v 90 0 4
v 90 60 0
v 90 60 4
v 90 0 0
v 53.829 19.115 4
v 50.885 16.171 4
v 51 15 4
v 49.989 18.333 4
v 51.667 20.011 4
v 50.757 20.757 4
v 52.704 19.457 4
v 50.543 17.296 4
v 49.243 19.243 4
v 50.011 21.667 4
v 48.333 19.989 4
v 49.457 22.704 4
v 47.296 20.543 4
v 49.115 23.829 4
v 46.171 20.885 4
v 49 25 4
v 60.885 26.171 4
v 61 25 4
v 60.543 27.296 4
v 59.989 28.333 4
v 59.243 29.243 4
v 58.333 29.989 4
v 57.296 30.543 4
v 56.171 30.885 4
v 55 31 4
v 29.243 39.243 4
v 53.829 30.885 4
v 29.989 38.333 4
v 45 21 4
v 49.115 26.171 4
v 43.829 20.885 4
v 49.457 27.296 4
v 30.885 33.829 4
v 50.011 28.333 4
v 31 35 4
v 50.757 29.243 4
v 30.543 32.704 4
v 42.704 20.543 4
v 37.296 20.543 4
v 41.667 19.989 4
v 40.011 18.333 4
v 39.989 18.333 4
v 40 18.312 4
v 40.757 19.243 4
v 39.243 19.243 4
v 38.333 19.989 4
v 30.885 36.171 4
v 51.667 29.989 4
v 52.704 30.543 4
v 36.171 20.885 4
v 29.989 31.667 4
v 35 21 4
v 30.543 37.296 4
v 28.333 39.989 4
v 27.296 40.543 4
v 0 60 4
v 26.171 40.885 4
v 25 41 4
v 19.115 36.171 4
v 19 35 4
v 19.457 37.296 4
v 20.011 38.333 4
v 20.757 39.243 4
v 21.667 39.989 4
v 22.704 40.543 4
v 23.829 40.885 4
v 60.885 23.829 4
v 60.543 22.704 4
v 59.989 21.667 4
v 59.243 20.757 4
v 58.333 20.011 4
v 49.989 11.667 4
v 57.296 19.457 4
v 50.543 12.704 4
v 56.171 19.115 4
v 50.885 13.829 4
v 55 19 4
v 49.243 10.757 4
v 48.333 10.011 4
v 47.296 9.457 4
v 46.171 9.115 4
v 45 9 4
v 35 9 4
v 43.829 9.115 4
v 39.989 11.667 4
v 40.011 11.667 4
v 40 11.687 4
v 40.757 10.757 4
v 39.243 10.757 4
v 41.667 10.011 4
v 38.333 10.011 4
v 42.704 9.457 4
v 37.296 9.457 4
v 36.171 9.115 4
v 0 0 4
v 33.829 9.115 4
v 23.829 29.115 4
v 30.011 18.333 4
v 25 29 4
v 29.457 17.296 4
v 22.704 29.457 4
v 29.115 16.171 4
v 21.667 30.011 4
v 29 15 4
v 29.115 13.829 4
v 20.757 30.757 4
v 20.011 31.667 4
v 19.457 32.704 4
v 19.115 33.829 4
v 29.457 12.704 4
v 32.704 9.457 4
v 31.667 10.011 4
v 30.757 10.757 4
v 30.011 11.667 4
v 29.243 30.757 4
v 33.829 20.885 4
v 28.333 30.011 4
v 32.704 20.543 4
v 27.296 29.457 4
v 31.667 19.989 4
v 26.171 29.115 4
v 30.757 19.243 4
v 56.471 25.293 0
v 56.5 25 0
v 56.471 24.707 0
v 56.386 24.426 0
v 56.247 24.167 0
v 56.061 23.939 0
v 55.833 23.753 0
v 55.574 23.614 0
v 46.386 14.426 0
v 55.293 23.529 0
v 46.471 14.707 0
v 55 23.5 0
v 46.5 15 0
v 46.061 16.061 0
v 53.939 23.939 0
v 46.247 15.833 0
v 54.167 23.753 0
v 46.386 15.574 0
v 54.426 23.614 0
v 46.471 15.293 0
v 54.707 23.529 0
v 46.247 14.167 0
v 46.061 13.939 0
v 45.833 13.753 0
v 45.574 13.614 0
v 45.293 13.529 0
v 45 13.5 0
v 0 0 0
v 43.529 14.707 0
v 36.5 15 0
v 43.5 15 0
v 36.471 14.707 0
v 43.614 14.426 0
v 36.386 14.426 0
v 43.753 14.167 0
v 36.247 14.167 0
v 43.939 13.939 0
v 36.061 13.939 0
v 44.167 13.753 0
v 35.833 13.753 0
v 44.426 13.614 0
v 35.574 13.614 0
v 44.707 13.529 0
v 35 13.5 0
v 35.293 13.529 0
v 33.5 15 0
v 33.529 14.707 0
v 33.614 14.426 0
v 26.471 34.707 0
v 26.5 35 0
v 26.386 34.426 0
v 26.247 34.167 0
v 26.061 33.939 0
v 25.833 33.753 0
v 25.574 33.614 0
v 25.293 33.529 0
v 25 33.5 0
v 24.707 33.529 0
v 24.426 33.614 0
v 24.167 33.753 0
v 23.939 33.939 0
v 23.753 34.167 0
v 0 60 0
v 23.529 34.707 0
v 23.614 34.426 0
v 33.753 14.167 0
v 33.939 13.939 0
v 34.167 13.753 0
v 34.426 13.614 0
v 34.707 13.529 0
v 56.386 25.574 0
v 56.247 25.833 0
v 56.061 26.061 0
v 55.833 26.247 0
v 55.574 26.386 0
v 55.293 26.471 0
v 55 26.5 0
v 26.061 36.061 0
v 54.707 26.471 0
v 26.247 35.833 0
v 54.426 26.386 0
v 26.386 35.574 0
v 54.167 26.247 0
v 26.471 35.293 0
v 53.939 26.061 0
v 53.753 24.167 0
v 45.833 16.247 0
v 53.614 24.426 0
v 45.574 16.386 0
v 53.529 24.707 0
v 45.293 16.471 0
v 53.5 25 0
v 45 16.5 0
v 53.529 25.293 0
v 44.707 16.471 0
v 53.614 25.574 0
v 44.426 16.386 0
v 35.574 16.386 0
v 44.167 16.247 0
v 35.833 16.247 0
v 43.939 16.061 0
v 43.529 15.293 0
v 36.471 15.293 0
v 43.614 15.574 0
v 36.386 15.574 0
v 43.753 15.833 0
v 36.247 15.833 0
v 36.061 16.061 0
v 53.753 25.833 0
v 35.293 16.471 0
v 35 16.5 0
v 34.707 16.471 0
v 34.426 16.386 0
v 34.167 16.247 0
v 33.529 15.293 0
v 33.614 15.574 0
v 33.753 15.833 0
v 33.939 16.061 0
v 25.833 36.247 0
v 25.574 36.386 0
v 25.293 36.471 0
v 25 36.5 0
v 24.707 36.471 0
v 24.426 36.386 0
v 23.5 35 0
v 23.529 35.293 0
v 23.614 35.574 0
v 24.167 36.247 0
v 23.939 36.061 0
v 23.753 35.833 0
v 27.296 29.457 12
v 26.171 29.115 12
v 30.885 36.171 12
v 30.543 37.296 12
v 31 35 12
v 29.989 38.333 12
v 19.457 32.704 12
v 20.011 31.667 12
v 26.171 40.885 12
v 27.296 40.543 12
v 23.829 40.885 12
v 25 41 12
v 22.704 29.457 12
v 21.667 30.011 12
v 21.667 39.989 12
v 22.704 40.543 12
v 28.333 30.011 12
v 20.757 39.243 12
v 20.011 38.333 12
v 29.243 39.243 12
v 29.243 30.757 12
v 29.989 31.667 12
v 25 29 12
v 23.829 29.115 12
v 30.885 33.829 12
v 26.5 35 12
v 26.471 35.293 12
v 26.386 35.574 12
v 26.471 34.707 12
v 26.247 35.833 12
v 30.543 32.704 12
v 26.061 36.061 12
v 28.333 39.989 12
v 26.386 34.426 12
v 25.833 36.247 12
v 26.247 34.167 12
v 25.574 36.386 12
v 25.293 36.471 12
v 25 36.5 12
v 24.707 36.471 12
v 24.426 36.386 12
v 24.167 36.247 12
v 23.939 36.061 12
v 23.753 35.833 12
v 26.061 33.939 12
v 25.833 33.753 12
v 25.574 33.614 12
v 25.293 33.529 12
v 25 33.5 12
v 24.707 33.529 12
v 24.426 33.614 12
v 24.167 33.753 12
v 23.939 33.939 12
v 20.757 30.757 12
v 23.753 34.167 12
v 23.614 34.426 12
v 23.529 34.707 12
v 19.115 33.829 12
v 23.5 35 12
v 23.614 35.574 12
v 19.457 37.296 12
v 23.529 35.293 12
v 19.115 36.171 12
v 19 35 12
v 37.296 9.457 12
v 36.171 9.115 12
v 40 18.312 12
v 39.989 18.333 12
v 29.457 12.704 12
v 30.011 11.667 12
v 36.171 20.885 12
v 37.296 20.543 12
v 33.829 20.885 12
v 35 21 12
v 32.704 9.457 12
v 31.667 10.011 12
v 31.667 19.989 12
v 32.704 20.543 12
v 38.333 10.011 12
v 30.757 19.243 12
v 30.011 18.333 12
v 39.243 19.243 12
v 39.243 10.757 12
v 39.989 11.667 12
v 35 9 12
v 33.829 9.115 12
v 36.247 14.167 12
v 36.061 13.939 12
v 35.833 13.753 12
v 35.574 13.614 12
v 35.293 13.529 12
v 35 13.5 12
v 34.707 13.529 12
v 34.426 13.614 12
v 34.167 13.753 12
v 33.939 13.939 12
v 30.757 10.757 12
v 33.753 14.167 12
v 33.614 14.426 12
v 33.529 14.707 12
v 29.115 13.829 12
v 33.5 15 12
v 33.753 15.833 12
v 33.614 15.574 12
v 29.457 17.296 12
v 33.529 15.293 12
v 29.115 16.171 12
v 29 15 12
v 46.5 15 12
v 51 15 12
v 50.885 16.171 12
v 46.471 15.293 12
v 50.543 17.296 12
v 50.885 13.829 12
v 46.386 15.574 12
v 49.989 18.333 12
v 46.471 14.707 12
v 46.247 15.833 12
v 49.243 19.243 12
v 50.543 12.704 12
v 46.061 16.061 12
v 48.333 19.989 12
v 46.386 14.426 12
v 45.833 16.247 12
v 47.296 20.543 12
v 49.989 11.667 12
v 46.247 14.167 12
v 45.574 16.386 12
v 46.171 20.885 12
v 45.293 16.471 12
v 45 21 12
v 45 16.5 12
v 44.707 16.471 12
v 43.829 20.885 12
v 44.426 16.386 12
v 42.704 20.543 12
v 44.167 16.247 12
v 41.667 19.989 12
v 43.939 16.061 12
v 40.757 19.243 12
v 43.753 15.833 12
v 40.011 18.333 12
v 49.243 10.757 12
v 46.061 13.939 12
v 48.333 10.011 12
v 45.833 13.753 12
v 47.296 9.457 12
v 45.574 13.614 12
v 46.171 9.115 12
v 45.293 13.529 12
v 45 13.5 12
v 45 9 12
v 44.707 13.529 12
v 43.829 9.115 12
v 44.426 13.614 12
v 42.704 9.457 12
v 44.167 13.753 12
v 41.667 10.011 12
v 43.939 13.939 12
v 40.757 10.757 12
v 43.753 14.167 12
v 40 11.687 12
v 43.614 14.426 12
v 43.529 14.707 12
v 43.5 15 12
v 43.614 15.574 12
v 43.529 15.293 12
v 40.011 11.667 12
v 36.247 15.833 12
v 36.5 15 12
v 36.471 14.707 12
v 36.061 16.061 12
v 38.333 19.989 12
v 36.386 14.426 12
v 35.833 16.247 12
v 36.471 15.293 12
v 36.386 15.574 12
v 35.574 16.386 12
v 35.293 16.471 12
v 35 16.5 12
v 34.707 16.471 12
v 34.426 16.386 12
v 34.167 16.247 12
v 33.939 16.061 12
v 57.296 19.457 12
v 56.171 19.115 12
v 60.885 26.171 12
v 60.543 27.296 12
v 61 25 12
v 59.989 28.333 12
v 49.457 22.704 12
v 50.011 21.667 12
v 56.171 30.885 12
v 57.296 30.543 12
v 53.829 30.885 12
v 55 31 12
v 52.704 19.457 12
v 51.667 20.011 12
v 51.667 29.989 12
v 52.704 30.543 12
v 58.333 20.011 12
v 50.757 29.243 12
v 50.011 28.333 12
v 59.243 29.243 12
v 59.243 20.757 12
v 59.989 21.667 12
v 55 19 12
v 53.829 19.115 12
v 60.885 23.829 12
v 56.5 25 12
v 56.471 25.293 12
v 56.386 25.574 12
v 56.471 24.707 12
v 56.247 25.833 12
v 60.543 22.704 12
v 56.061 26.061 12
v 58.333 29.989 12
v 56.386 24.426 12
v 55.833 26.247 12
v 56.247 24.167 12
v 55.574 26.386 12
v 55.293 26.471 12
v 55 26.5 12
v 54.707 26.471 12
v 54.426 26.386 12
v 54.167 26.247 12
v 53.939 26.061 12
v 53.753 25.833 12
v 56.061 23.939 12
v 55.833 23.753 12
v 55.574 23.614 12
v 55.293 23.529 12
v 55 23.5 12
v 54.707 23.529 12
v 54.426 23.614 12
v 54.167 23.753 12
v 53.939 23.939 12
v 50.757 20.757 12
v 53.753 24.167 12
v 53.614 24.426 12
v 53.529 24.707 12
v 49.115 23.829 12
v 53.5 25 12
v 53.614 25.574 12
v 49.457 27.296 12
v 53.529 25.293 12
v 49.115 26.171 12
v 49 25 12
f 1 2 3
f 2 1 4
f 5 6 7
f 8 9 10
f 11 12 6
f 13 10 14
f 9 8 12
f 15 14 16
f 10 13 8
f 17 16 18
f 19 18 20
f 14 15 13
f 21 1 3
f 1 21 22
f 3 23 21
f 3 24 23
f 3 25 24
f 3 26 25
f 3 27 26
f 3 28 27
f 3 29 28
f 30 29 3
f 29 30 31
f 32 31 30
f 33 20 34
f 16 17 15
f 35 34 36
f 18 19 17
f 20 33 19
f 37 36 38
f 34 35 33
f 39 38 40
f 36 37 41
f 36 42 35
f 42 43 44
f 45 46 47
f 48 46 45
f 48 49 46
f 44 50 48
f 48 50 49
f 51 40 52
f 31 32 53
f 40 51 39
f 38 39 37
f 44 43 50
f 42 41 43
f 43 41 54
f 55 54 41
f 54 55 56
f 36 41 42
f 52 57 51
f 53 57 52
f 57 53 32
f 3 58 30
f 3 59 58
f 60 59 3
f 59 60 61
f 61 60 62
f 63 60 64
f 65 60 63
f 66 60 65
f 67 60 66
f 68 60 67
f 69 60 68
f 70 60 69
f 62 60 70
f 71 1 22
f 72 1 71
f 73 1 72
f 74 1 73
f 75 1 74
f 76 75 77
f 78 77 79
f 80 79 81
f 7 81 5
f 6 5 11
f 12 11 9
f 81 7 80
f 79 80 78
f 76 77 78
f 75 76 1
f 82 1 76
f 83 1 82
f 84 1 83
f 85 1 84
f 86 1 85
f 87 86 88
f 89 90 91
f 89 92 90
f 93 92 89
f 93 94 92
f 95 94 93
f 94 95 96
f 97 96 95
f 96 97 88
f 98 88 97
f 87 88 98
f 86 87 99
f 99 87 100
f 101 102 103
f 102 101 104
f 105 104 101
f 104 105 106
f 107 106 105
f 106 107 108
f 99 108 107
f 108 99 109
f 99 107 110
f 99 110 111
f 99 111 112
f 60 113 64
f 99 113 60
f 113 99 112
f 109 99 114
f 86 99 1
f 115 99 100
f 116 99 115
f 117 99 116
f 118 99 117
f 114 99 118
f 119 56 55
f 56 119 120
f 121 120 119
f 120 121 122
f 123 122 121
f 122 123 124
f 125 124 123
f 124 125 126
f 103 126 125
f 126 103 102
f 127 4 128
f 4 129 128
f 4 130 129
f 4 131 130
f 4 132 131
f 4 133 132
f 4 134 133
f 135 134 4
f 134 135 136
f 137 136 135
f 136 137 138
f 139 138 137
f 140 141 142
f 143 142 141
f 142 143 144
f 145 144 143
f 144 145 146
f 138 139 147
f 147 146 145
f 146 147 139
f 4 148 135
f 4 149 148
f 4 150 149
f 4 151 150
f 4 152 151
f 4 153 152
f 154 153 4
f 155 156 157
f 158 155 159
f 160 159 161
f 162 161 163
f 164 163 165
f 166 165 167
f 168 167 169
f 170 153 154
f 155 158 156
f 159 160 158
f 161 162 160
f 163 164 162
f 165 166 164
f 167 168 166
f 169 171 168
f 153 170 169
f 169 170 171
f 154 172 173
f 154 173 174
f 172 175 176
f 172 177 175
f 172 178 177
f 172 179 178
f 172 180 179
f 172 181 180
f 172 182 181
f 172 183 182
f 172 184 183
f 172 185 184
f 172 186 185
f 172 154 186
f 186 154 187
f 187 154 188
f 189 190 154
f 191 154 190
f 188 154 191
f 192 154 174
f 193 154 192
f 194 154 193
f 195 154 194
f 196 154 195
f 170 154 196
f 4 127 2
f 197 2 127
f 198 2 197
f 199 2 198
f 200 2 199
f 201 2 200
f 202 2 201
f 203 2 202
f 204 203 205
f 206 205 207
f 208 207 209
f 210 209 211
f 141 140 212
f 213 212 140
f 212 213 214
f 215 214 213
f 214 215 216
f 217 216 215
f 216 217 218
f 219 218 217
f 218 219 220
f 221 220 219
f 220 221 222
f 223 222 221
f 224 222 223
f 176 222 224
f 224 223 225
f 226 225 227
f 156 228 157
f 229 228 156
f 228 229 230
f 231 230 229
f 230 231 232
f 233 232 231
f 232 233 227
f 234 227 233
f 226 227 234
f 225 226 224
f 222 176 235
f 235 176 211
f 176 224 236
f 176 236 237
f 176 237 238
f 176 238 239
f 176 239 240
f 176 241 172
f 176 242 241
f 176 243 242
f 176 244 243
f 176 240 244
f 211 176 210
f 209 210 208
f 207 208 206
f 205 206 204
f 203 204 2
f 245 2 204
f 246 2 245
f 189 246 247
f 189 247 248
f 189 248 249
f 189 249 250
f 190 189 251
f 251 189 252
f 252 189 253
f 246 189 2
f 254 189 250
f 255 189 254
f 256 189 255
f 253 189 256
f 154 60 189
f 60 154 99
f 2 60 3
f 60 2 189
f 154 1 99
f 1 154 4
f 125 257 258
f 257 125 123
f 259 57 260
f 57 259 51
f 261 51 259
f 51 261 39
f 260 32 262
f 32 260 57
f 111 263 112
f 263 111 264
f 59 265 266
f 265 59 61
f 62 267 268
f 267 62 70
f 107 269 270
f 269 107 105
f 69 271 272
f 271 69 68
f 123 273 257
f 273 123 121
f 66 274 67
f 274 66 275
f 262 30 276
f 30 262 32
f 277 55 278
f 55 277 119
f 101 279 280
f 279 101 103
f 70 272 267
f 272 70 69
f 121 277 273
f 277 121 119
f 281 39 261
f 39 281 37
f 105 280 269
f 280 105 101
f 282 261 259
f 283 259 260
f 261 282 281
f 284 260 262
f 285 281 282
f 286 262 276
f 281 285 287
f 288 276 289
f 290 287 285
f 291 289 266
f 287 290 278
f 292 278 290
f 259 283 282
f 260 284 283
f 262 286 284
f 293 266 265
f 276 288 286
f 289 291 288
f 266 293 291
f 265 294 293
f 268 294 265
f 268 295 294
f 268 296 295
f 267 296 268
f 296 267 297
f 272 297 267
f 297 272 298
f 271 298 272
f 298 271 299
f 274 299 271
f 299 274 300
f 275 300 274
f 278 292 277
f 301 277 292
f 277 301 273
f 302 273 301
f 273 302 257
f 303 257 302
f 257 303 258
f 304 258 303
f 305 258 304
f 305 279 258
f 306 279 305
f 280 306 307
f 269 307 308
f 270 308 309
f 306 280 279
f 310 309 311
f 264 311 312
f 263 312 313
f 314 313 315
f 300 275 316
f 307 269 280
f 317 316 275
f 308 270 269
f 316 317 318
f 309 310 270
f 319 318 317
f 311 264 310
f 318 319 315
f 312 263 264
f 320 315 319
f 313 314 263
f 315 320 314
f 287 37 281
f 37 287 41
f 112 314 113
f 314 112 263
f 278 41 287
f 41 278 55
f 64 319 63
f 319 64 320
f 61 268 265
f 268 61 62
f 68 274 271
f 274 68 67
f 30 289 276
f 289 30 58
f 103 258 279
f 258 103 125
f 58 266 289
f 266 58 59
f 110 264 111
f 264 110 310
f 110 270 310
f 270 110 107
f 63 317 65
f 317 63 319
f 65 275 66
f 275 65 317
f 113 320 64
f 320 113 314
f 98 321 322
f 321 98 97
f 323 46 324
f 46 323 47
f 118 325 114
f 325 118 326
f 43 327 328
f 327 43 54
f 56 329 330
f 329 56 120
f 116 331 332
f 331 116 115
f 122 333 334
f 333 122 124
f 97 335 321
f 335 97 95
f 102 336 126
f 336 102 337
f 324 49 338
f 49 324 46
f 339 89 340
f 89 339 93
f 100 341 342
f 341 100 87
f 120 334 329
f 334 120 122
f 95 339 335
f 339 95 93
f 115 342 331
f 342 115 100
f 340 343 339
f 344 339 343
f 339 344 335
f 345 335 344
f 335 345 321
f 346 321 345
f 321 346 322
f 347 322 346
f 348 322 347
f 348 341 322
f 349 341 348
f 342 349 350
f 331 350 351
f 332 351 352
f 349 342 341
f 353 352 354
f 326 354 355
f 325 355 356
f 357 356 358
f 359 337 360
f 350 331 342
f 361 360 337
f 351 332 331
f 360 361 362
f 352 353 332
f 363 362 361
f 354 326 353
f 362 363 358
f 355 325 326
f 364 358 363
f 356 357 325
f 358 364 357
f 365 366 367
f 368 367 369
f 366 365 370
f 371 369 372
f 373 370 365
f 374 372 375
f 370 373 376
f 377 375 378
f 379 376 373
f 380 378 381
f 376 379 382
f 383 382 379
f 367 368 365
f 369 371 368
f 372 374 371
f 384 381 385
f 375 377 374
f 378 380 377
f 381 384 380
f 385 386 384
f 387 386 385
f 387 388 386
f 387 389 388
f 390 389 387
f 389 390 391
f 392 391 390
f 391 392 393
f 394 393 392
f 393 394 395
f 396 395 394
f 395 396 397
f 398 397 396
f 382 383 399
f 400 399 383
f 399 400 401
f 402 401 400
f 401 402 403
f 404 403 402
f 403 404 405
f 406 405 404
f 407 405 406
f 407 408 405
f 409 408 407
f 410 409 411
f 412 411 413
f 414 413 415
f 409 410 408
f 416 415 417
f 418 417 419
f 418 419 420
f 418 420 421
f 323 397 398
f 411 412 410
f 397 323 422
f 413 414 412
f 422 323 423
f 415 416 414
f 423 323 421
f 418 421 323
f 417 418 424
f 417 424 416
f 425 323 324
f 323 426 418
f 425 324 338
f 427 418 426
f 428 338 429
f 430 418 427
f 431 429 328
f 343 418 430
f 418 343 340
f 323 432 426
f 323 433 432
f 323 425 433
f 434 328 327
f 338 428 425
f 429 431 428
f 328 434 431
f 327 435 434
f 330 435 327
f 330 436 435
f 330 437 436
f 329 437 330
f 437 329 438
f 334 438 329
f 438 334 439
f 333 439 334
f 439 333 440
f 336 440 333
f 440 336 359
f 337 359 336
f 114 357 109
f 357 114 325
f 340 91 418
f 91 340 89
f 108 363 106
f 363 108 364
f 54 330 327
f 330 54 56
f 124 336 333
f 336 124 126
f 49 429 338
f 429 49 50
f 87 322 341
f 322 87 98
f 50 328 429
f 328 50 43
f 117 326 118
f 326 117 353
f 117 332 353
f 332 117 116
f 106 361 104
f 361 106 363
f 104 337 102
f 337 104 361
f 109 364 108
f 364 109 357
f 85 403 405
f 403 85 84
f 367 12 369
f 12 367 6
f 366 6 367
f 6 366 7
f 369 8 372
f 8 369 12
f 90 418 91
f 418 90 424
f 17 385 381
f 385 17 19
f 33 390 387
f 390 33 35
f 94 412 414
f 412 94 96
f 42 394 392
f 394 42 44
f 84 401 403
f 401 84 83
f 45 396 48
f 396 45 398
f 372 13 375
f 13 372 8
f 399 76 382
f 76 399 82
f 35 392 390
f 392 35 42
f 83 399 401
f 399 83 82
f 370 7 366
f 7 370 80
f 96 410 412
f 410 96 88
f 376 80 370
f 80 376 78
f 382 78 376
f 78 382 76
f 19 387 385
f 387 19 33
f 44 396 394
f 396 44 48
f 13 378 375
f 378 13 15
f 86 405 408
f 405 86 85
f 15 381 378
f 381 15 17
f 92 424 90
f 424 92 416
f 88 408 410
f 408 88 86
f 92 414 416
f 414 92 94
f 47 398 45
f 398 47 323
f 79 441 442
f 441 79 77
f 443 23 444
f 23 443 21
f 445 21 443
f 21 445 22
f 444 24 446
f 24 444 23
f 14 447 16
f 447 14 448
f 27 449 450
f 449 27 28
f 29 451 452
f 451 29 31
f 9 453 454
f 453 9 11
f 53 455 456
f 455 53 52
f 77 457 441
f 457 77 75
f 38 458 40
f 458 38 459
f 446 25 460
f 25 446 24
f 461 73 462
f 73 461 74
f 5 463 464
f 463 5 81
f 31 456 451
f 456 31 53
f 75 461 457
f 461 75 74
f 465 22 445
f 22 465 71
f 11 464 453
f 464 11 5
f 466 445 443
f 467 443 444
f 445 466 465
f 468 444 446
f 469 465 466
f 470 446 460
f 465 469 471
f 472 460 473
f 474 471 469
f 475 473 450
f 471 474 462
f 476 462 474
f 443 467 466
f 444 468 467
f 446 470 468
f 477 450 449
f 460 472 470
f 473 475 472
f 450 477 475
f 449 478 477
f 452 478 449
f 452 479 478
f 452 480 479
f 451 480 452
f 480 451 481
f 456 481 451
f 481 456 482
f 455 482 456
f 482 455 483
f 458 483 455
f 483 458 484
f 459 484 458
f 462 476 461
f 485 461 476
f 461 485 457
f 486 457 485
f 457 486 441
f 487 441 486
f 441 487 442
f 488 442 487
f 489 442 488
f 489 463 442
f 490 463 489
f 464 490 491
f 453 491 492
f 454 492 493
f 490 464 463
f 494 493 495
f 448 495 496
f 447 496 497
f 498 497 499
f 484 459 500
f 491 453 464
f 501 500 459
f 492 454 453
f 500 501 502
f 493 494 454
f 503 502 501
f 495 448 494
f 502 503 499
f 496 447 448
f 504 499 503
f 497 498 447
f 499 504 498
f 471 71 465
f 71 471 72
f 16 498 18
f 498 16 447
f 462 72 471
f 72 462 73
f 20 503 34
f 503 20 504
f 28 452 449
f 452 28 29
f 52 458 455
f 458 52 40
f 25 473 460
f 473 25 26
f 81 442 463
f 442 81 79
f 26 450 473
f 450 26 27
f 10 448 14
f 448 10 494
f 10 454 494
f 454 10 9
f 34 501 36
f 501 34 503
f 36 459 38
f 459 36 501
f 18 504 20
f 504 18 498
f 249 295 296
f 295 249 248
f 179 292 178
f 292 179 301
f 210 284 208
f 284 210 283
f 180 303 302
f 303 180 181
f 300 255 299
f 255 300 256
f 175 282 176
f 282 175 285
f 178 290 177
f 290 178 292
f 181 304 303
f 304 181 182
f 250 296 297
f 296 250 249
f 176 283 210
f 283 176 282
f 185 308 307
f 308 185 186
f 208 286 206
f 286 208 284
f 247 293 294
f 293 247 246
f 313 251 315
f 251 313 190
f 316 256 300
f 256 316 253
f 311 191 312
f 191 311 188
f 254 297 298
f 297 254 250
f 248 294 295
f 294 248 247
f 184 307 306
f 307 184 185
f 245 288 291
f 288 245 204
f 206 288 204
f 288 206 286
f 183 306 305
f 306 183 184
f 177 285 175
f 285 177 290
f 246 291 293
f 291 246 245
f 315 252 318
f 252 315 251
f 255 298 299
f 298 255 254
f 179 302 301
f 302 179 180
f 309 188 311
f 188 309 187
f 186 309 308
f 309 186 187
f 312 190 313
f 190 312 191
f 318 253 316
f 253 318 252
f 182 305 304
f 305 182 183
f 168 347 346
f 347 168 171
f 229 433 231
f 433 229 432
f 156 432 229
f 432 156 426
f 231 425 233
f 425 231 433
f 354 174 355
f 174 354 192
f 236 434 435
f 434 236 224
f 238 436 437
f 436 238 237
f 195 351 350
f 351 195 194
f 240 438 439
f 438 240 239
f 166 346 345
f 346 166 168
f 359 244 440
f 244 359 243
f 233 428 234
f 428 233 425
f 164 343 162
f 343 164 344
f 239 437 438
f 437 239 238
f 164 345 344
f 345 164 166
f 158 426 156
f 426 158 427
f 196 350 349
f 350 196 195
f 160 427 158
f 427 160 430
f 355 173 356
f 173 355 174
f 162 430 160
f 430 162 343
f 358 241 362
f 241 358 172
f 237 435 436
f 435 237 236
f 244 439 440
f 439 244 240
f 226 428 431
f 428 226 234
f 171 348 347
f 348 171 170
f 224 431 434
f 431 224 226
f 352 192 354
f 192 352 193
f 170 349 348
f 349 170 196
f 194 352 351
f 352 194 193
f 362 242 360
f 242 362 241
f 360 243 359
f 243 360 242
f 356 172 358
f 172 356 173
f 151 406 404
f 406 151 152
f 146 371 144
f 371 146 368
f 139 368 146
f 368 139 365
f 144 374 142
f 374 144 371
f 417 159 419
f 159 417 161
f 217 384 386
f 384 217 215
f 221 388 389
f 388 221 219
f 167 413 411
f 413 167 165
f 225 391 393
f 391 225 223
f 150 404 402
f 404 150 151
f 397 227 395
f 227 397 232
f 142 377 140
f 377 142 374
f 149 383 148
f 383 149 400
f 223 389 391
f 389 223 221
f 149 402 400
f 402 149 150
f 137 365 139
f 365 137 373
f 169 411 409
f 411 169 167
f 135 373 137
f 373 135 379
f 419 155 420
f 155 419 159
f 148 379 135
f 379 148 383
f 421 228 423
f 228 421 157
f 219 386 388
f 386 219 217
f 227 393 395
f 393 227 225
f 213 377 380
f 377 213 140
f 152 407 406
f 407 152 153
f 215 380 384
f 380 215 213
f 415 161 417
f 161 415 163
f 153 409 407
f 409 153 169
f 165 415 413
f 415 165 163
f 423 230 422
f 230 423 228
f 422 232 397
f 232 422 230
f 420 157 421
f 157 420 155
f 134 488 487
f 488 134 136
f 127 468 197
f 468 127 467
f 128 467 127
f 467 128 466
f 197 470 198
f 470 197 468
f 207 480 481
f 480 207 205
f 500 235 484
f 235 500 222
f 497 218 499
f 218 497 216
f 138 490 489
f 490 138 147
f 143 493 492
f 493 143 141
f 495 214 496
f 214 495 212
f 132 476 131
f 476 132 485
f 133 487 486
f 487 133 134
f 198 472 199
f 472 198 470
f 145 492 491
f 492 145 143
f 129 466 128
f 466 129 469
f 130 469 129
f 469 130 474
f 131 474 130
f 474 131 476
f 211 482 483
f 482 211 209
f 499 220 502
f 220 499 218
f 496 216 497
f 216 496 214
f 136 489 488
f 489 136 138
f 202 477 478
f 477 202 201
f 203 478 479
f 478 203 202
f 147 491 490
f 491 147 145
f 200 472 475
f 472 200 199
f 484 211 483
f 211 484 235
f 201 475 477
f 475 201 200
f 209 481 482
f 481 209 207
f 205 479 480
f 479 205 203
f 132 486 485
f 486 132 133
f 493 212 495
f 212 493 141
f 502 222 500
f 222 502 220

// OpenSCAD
$fn = 32;

// ----------------------------------------------------------------------
// Boss field: plate with bosses at given coordinates
// ----------------------------------------------------------------------

// --- parameters (mm) ---
plate_l = 90;             // plate length, X
plate_w = 60;             // plate width, Y
plate_t = 4;              // plate thickness, Z
boss_d = 12;              // boss diameter
boss_h = 8;               // boss height above the plate
bore_d = 3;               // boss bore

total_h = plate_t + boss_h;  // overall height

difference() {
  union() {
    cube([plate_l, plate_w, plate_t]);
    translate([25, 35, plate_t]) cylinder(h = boss_h, d = boss_d);
    translate([35, 15, plate_t]) cylinder(h = boss_h, d = boss_d);
    translate([45, 15, plate_t]) cylinder(h = boss_h, d = boss_d);
    translate([55, 25, plate_t]) cylinder(h = boss_h, d = boss_d);
  }
  translate([25, 35, -1]) cylinder(h = total_h + 2, d = bore_d);
  translate([35, 15, -1]) cylinder(h = total_h + 2, d = bore_d);
  translate([45, 15, -1]) cylinder(h = total_h + 2, d = bore_d);
  translate([55, 25, -1]) cylinder(h = total_h + 2, d = bore_d);
}
